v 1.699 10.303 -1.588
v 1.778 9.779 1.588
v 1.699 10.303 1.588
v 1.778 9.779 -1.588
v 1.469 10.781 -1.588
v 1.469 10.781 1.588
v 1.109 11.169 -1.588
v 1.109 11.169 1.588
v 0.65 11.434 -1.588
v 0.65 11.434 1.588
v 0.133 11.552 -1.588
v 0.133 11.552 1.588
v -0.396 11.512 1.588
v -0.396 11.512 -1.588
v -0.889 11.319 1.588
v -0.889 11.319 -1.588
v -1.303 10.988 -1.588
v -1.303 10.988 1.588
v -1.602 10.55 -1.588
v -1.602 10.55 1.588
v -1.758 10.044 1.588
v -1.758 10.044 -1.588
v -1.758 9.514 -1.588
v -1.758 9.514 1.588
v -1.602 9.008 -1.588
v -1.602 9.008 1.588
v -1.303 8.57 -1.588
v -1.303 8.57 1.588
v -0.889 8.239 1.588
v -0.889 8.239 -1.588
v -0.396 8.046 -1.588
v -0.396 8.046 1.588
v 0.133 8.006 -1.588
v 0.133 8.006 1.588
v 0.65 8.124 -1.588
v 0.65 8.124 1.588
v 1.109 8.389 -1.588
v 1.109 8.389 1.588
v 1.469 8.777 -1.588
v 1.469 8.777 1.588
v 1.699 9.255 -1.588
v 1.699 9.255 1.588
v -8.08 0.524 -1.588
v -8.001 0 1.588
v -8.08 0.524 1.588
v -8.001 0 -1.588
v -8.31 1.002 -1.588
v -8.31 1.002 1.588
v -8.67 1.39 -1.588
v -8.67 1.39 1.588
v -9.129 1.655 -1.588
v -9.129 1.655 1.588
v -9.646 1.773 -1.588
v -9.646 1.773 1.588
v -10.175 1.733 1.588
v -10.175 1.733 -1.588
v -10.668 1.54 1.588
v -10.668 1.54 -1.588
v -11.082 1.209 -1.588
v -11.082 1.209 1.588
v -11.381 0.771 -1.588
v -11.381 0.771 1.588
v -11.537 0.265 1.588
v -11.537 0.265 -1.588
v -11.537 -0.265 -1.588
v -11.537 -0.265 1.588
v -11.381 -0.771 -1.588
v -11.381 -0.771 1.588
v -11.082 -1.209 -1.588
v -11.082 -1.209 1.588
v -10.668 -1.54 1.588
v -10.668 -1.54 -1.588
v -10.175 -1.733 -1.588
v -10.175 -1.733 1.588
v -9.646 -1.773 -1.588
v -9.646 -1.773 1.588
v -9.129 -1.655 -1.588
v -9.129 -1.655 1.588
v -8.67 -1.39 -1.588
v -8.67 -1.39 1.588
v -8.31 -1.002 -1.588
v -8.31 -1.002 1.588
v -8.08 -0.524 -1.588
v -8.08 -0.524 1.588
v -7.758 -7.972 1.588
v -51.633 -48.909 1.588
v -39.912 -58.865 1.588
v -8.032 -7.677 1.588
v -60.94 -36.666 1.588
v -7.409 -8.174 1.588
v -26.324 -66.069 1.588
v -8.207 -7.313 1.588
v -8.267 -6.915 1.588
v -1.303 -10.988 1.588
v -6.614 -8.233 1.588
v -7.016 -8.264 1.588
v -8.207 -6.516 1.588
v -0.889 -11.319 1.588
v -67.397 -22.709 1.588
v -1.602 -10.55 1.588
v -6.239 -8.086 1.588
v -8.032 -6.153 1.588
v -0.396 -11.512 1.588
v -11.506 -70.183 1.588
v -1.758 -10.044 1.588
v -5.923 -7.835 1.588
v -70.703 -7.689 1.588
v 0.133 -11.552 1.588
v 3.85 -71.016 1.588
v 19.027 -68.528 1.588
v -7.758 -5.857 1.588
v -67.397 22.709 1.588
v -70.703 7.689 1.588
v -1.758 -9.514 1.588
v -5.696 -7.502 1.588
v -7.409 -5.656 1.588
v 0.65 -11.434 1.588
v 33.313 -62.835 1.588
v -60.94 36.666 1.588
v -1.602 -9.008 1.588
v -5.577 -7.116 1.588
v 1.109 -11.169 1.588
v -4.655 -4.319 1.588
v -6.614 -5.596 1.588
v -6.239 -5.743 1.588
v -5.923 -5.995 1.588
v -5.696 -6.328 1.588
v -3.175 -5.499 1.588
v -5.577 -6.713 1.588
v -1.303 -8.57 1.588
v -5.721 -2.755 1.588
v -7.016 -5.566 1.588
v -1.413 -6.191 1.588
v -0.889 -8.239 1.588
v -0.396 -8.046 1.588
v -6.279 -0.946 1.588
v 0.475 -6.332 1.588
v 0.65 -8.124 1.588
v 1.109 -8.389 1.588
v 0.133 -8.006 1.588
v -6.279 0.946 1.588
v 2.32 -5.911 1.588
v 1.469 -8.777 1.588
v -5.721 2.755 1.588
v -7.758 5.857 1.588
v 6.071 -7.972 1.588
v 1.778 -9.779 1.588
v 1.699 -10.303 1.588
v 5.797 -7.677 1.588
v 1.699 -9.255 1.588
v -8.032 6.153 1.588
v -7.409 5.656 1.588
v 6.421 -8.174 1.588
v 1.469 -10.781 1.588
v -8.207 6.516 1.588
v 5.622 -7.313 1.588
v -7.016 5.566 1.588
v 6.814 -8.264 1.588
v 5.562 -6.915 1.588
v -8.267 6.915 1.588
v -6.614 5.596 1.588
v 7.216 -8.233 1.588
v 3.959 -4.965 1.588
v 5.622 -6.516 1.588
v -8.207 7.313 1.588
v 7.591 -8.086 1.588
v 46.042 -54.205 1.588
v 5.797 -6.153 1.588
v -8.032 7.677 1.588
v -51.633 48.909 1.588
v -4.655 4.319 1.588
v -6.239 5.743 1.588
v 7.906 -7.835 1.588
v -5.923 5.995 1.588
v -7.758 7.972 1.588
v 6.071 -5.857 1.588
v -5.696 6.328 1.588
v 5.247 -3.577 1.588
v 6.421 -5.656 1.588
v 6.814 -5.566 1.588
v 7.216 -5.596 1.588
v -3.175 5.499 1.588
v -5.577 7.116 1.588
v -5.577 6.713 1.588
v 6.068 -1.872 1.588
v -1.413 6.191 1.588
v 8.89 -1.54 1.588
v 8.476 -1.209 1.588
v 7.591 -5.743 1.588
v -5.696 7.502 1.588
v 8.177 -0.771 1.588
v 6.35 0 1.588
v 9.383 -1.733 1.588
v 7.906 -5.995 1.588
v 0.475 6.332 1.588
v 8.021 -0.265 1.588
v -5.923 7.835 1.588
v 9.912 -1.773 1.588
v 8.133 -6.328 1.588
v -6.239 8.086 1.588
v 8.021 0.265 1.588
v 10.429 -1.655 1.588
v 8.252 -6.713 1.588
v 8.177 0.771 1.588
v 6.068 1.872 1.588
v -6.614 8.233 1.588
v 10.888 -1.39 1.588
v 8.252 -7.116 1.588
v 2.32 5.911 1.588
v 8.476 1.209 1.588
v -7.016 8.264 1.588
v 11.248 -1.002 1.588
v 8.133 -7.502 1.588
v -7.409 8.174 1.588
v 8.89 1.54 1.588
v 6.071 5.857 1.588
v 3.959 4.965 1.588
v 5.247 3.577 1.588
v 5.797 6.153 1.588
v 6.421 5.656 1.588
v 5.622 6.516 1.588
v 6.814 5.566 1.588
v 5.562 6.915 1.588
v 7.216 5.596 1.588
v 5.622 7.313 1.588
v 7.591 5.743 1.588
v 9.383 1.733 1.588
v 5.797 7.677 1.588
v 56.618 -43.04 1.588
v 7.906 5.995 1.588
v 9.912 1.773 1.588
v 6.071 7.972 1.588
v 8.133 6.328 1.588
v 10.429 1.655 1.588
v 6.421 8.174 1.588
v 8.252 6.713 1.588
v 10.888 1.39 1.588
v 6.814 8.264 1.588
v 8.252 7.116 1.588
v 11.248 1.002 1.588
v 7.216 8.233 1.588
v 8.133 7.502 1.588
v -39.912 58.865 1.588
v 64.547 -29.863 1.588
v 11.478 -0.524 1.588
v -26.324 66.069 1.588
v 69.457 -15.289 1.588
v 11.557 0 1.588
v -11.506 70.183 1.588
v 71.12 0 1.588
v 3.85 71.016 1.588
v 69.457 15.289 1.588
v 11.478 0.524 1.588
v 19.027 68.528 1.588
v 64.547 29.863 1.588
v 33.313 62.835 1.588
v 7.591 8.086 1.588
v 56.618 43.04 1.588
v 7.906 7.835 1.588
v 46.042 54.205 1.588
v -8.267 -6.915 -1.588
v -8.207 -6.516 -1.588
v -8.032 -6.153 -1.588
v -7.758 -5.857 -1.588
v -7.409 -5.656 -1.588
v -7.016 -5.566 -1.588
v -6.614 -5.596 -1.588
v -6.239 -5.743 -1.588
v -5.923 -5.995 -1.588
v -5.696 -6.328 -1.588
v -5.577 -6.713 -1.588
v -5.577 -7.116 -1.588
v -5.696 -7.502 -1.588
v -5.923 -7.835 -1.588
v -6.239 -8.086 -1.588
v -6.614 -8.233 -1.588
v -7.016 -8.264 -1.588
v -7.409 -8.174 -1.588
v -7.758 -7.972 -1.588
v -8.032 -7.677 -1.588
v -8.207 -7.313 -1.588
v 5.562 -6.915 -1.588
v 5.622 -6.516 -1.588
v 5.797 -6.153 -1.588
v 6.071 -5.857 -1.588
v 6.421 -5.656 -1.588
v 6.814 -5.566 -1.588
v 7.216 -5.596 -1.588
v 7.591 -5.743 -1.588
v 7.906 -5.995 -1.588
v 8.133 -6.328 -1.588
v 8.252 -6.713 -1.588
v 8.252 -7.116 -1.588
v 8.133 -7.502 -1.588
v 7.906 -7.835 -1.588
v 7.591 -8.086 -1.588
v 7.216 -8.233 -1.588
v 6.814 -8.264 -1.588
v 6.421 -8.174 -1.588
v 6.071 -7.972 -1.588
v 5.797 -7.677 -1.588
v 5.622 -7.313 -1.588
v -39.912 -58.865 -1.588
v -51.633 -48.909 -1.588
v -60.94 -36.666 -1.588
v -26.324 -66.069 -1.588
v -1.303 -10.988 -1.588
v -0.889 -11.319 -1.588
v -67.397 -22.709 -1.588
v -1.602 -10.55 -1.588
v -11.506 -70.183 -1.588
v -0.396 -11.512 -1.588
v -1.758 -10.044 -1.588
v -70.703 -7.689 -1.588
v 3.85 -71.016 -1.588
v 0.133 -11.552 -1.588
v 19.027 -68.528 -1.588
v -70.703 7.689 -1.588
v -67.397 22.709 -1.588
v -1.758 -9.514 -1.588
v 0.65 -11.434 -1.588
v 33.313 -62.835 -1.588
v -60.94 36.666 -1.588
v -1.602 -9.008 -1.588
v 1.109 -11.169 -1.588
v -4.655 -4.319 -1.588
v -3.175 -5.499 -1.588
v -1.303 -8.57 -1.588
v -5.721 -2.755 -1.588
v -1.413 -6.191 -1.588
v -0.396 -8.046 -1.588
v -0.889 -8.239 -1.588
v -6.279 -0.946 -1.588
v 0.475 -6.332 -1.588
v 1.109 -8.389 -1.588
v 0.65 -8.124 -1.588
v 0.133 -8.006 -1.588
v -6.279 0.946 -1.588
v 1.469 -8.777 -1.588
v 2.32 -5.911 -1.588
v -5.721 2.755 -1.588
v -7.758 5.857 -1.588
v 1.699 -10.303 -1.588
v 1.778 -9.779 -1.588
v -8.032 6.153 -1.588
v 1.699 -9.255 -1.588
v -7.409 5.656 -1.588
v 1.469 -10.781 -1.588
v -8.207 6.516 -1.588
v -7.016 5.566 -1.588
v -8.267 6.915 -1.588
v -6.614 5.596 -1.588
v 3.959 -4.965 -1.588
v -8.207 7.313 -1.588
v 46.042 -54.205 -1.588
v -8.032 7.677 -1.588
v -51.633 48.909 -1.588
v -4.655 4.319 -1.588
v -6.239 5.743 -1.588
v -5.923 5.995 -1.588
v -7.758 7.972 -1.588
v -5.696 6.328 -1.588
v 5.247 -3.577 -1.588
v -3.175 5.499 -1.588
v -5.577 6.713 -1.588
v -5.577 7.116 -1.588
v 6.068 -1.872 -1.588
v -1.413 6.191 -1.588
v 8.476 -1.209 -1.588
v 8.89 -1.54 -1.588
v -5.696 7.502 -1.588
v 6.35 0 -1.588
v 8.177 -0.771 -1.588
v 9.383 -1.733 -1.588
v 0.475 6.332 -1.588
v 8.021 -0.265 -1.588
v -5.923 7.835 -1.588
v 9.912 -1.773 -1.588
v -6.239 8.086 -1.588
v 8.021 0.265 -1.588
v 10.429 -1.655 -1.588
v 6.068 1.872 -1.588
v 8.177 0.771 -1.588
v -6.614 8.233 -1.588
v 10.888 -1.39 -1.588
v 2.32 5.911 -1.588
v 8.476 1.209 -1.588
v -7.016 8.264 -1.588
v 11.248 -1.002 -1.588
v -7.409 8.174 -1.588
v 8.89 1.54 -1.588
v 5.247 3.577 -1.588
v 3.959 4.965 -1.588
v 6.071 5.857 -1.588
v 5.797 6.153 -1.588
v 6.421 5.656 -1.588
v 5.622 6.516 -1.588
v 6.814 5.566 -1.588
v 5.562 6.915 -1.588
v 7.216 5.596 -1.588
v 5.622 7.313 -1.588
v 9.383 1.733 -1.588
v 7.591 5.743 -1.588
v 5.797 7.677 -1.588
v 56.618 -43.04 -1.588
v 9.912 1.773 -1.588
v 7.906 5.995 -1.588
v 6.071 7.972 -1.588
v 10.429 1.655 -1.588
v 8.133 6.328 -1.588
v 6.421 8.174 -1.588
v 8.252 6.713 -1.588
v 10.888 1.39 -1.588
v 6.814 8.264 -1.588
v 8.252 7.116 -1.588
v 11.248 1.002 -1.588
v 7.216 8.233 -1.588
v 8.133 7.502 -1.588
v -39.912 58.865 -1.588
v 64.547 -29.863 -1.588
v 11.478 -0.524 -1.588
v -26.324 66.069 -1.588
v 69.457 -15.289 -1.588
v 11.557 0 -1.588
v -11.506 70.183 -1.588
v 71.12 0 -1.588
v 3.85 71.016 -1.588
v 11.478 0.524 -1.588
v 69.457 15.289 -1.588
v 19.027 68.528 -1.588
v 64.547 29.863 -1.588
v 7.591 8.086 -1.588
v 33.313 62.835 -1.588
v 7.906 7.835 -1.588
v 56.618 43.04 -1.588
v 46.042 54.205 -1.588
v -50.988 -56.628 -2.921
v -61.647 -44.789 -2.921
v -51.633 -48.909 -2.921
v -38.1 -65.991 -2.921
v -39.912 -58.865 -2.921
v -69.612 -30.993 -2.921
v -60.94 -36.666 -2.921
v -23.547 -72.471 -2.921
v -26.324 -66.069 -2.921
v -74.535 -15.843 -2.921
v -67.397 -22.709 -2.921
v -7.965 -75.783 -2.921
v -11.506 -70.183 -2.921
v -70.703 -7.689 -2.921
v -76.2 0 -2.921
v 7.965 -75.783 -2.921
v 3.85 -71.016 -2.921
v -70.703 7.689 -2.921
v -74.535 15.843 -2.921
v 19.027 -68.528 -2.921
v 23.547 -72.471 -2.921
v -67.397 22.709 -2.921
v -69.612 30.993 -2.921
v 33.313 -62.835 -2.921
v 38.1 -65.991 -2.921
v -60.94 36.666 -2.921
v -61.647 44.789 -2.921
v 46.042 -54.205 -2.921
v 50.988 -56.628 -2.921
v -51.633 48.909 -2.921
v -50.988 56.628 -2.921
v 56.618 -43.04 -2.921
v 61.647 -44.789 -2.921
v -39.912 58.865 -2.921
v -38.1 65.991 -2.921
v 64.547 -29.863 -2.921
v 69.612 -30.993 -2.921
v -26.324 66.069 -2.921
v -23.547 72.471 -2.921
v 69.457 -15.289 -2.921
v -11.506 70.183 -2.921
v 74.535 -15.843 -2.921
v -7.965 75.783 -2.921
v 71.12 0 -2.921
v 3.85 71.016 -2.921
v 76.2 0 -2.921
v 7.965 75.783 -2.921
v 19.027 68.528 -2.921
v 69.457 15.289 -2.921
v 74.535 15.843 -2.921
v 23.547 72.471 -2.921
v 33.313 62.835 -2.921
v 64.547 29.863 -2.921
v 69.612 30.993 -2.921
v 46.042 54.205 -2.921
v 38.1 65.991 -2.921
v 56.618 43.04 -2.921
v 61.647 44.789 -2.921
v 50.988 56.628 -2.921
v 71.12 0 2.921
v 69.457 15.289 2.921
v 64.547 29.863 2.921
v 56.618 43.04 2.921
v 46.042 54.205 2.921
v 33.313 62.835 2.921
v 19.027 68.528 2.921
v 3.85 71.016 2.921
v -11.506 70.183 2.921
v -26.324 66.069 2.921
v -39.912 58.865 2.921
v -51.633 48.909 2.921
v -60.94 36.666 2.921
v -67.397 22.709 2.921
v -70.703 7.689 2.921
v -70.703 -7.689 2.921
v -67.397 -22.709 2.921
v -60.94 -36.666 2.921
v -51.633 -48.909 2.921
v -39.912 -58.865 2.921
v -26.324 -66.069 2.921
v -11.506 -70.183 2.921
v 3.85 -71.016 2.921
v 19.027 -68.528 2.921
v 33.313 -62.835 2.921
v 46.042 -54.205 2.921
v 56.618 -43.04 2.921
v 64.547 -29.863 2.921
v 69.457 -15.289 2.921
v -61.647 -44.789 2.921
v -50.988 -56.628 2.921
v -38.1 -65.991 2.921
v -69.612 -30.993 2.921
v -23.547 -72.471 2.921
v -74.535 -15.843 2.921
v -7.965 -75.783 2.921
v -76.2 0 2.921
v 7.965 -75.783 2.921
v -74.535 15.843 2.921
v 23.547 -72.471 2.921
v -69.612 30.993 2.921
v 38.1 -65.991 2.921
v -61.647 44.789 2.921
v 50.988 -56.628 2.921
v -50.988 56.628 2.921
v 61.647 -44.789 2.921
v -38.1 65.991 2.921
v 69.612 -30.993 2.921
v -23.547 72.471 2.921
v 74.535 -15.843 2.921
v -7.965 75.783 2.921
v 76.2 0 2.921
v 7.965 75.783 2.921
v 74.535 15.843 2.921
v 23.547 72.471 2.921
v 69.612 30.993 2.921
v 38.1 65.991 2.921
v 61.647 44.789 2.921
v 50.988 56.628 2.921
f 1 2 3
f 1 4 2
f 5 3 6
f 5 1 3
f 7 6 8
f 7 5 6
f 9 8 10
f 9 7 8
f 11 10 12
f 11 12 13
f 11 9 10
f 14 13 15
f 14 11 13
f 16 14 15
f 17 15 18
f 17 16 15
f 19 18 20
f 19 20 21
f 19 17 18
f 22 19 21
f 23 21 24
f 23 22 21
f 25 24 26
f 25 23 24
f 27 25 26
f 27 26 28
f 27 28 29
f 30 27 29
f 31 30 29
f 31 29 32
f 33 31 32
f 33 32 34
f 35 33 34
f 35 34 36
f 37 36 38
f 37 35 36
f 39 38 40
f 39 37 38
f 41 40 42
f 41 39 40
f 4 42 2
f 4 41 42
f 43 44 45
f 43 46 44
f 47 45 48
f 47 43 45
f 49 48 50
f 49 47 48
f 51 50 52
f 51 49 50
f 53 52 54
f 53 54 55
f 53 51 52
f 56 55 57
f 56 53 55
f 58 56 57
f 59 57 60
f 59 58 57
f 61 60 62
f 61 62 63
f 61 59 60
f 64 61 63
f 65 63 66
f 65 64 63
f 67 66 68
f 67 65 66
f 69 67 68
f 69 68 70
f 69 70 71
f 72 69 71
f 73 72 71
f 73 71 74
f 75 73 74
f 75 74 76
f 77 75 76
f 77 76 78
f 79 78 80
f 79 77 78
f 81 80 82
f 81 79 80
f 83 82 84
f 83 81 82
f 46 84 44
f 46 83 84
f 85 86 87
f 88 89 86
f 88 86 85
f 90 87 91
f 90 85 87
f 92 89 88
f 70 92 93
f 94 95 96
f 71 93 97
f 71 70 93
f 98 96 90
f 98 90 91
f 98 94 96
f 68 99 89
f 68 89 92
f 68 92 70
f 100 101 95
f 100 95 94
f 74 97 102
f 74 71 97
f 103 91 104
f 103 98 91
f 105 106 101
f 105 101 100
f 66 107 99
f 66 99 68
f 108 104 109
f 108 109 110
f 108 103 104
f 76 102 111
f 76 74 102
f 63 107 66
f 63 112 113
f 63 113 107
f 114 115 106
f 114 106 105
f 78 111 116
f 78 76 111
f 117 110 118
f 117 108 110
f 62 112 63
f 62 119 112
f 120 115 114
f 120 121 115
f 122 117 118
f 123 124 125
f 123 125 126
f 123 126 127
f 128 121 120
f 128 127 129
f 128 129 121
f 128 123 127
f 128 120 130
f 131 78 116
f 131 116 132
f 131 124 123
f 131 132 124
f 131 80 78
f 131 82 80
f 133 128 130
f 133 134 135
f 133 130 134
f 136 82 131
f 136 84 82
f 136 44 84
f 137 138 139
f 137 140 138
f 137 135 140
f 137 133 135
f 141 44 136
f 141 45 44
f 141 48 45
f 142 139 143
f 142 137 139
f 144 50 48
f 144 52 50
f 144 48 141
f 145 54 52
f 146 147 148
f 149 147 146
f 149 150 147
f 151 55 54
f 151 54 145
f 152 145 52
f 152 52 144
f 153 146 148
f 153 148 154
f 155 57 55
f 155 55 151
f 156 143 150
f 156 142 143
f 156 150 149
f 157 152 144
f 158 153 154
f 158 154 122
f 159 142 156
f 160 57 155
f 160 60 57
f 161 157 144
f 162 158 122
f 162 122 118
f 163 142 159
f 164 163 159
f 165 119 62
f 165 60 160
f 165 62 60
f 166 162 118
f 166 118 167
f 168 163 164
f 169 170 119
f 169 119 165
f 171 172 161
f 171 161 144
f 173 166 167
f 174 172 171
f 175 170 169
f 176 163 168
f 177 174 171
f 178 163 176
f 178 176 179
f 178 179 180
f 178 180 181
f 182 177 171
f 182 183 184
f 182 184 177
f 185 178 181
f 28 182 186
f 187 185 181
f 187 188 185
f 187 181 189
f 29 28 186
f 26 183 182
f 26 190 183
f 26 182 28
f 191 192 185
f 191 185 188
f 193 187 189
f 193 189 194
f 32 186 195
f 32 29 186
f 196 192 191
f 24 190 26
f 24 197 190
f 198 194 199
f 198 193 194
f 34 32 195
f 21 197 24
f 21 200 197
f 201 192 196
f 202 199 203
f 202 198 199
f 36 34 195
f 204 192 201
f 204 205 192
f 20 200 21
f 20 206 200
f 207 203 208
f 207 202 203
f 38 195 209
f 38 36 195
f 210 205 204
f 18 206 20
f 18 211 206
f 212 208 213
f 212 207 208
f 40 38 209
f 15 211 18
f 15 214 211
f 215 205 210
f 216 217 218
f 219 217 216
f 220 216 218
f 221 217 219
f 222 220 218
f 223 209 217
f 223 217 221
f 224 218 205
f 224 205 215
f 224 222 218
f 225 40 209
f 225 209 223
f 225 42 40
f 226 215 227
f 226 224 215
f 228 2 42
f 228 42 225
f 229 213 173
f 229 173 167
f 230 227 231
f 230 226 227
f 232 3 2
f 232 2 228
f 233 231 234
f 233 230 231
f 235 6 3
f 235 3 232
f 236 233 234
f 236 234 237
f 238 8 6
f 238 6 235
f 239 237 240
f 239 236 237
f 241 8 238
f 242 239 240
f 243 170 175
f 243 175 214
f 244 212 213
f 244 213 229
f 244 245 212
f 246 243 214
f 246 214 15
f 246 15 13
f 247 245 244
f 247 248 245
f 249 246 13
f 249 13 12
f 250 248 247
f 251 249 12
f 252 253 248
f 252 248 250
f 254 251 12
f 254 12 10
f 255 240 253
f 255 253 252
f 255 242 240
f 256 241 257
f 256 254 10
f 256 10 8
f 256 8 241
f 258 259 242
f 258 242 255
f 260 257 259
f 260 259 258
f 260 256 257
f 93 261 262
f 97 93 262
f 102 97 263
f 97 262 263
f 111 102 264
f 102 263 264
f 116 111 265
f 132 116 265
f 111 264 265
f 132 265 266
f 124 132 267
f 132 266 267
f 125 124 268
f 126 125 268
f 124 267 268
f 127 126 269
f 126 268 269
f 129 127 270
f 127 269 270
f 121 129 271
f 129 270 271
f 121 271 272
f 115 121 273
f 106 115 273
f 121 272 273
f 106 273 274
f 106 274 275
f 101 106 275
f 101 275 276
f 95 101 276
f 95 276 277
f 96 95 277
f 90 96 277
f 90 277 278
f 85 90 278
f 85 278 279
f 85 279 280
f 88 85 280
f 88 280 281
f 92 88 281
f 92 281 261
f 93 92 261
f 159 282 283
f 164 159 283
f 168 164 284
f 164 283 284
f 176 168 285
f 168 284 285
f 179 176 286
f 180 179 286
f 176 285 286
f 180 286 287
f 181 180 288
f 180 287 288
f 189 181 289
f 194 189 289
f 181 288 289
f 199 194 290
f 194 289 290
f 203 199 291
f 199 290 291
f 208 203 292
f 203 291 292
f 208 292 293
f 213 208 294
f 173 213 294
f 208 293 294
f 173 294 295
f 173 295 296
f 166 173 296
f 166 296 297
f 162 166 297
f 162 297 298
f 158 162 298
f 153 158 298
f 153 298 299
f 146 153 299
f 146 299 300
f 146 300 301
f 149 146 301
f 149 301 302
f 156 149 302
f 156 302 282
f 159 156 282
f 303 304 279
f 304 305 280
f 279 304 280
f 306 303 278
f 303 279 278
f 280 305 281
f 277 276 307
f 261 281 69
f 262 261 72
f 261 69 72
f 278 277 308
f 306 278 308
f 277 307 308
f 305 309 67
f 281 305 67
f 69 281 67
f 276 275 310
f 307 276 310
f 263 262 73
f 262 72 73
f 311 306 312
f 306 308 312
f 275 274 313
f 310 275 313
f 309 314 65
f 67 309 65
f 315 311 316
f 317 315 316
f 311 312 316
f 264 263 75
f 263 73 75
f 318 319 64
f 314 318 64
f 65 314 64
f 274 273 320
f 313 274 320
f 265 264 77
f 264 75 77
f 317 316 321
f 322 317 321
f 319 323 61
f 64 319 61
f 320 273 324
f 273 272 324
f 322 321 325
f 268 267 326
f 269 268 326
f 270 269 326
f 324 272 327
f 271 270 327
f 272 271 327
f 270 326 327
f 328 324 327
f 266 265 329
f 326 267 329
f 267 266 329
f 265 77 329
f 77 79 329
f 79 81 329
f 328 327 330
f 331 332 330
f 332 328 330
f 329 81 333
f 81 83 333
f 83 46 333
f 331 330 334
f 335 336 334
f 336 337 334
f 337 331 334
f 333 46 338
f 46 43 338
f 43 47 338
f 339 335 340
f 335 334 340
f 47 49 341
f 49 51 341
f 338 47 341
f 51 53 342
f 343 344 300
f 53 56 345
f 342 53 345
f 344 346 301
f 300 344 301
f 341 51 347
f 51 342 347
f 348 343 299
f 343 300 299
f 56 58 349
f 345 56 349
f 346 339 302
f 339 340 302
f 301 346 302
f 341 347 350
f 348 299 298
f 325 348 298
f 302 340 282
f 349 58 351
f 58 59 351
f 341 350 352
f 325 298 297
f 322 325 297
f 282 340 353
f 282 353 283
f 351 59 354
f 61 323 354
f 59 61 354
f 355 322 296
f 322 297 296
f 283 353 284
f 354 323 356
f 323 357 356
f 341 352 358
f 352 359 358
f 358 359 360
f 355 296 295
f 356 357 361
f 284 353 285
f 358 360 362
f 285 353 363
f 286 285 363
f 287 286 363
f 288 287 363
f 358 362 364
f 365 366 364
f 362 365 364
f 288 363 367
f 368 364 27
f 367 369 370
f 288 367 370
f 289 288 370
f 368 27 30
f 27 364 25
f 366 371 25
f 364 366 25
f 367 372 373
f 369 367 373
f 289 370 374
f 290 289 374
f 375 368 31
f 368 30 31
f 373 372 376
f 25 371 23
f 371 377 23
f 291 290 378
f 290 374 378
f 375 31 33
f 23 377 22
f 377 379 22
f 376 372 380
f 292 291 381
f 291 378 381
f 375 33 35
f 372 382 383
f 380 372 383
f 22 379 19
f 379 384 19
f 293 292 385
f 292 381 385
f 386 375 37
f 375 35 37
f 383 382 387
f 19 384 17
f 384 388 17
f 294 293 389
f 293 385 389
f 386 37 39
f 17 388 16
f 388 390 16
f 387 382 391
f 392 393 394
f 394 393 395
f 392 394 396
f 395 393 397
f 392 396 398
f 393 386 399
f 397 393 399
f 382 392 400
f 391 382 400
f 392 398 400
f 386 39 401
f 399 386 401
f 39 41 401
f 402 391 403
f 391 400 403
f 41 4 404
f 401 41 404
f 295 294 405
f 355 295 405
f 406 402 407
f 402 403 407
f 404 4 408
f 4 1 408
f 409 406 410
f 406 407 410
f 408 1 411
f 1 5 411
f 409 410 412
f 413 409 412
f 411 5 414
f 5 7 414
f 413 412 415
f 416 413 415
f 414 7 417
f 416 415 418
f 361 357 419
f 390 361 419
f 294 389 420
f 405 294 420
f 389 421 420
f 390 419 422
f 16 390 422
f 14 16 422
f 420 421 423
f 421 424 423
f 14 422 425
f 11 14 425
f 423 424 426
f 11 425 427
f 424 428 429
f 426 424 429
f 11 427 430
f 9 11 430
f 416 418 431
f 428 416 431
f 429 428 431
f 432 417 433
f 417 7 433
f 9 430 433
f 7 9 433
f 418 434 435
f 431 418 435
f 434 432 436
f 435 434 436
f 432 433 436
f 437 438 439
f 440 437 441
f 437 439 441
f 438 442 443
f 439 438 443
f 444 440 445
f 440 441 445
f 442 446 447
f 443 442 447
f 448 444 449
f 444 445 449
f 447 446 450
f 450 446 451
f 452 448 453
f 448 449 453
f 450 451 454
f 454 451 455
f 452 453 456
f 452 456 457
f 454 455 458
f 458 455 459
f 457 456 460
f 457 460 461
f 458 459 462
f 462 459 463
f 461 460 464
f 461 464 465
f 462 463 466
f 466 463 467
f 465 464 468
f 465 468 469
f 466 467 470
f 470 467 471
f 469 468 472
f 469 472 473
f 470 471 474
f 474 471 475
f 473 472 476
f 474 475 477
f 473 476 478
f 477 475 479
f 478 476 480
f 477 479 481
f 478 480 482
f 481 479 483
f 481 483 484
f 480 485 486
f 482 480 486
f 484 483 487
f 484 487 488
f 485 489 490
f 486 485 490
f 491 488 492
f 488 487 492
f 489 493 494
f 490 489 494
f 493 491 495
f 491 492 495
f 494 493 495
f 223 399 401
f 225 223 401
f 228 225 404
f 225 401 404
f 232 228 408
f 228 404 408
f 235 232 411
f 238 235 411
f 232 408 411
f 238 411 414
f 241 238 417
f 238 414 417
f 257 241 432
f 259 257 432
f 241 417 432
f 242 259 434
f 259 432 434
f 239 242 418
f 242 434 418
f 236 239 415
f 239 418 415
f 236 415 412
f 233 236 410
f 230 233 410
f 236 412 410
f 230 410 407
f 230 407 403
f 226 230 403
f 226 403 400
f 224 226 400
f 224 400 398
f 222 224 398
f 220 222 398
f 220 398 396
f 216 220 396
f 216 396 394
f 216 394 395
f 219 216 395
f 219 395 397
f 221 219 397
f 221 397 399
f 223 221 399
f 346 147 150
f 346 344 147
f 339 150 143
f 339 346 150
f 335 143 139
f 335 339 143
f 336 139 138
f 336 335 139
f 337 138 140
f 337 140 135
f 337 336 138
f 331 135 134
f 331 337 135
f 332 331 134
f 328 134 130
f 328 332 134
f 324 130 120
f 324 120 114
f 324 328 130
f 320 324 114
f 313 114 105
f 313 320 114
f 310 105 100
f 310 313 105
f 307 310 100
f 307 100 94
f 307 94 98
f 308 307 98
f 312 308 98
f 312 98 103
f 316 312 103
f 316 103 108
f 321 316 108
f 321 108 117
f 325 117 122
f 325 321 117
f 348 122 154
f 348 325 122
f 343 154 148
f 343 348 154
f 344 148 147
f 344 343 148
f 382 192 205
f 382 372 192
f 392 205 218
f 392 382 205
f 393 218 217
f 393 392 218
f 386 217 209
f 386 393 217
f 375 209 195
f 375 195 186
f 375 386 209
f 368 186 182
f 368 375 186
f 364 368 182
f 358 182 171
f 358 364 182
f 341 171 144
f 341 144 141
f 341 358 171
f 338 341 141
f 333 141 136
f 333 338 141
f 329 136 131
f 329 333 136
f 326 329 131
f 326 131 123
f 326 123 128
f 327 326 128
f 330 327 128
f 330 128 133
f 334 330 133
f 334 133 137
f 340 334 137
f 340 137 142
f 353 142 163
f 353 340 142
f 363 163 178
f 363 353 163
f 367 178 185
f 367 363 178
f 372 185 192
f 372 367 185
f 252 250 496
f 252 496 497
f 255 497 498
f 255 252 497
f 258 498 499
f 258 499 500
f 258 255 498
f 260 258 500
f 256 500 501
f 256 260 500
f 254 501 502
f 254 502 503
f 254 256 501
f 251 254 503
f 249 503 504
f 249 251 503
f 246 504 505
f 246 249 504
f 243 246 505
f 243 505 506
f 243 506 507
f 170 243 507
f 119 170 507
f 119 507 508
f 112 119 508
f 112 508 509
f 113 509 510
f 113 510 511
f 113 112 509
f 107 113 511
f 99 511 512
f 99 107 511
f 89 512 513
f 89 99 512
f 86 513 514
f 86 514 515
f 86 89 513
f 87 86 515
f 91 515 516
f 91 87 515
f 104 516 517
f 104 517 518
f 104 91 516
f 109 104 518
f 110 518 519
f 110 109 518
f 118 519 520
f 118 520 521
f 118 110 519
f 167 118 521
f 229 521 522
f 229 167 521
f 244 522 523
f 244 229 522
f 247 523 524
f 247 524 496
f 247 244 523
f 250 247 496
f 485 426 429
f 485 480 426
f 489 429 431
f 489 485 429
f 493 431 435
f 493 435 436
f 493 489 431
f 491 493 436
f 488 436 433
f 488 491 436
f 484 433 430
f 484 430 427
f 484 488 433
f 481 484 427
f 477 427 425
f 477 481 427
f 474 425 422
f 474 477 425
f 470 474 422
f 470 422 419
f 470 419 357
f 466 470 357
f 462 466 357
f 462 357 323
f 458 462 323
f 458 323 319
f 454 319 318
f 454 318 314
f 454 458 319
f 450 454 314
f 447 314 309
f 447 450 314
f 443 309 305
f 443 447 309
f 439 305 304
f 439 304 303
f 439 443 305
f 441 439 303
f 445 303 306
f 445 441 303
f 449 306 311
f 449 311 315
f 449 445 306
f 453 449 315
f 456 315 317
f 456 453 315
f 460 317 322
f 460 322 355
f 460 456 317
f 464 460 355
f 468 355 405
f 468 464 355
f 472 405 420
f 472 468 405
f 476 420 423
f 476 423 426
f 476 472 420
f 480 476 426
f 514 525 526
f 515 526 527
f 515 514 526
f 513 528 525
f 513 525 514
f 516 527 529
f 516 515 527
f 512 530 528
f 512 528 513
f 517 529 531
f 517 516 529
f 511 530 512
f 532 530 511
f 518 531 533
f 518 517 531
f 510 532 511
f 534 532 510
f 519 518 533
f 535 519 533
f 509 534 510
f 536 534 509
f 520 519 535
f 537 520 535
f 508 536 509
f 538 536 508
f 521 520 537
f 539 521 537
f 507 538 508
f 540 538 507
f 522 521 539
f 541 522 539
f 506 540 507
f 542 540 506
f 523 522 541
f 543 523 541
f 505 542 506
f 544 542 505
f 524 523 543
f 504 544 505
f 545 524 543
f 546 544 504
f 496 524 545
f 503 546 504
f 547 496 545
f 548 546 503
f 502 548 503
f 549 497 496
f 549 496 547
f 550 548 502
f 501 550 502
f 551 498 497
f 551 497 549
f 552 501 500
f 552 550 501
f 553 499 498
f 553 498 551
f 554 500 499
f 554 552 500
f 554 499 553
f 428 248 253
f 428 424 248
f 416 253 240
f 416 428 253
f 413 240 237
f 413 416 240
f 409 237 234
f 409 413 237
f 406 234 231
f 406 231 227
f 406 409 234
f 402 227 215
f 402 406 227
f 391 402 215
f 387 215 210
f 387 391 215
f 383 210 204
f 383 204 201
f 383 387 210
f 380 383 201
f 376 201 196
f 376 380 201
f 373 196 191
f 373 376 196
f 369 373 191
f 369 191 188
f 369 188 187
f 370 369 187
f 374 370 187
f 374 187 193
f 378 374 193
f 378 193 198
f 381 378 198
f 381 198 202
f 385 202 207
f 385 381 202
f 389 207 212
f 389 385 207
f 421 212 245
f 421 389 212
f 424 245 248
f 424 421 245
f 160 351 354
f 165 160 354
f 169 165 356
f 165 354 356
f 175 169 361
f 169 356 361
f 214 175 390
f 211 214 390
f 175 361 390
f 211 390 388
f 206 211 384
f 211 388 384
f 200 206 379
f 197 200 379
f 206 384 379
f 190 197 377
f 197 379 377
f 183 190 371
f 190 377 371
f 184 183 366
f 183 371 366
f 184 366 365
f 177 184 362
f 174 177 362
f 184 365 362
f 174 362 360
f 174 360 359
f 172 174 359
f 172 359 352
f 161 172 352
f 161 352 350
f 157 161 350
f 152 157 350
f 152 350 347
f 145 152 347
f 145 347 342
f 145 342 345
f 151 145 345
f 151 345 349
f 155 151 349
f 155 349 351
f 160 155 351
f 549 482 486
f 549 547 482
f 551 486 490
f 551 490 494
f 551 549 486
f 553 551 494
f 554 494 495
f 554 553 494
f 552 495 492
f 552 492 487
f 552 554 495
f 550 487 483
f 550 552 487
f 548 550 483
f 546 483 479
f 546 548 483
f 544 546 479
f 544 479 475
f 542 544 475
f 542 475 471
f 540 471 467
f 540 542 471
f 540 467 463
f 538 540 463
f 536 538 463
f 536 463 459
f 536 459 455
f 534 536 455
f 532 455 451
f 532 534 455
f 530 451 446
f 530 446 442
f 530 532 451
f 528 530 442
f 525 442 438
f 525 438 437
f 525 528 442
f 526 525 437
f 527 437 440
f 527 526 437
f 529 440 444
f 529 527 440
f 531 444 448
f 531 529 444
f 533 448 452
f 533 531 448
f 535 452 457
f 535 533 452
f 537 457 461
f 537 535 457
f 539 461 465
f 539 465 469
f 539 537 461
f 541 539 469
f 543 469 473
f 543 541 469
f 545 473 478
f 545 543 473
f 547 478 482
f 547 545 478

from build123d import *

# Parameters (mm, degrees)
SKETCH1_R                 = 76.2
SKETCH1_R_2               = 71.12
BOSS_EXTRUDE1_DEPTH       = 2.921
SKETCH3_R                 = 71.12
SKETCH3_R_2               = 6.35
SKETCH3_R_3               = 1.778
BOSS_EXTRUDE2_DEPTH       = 1.5875
F_6_32_TAPPED_HOLE1_D     = 2.7051
F_6_32_TAPPED_HOLE1_DEPTH = 3.175


with BuildPart() as part:
    # Sketch1 → Boss-Extrude1 (new body, symmetric)
    with BuildSketch(Plane.XY):
        Circle(SKETCH1_R)
        Circle(SKETCH1_R_2, mode=Mode.SUBTRACT)
    extrude(amount=BOSS_EXTRUDE1_DEPTH, both=True)

    # Sketch3 → Boss-Extrude2 (add, symmetric)
    with BuildSketch(Plane.XY):
        Circle(SKETCH3_R)
        Circle(SKETCH3_R_2, mode=Mode.SUBTRACT)
        with Locations((0, 9.779)):
            Circle(SKETCH3_R_3, mode=Mode.SUBTRACT)
        with Locations((9.779, 0)):
            Circle(SKETCH3_R_3, mode=Mode.SUBTRACT)
        with Locations((0, -9.779)):
            Circle(SKETCH3_R_3, mode=Mode.SUBTRACT)
        with Locations((-9.779, 0)):
            Circle(SKETCH3_R_3, mode=Mode.SUBTRACT)
    extrude(amount=BOSS_EXTRUDE2_DEPTH, both=True)

    # #6-32 Tapped Hole1
    with Locations(Plane.XY.offset(1.5875)):
        with Locations((-6.914797213, 6.914797213), (6.914797213, 6.914797213), (6.914797213, -6.914797213), (-6.914797213, -6.914797213)):
            Hole(F_6_32_TAPPED_HOLE1_D / 2, depth=F_6_32_TAPPED_HOLE1_DEPTH)


solid = part.part
